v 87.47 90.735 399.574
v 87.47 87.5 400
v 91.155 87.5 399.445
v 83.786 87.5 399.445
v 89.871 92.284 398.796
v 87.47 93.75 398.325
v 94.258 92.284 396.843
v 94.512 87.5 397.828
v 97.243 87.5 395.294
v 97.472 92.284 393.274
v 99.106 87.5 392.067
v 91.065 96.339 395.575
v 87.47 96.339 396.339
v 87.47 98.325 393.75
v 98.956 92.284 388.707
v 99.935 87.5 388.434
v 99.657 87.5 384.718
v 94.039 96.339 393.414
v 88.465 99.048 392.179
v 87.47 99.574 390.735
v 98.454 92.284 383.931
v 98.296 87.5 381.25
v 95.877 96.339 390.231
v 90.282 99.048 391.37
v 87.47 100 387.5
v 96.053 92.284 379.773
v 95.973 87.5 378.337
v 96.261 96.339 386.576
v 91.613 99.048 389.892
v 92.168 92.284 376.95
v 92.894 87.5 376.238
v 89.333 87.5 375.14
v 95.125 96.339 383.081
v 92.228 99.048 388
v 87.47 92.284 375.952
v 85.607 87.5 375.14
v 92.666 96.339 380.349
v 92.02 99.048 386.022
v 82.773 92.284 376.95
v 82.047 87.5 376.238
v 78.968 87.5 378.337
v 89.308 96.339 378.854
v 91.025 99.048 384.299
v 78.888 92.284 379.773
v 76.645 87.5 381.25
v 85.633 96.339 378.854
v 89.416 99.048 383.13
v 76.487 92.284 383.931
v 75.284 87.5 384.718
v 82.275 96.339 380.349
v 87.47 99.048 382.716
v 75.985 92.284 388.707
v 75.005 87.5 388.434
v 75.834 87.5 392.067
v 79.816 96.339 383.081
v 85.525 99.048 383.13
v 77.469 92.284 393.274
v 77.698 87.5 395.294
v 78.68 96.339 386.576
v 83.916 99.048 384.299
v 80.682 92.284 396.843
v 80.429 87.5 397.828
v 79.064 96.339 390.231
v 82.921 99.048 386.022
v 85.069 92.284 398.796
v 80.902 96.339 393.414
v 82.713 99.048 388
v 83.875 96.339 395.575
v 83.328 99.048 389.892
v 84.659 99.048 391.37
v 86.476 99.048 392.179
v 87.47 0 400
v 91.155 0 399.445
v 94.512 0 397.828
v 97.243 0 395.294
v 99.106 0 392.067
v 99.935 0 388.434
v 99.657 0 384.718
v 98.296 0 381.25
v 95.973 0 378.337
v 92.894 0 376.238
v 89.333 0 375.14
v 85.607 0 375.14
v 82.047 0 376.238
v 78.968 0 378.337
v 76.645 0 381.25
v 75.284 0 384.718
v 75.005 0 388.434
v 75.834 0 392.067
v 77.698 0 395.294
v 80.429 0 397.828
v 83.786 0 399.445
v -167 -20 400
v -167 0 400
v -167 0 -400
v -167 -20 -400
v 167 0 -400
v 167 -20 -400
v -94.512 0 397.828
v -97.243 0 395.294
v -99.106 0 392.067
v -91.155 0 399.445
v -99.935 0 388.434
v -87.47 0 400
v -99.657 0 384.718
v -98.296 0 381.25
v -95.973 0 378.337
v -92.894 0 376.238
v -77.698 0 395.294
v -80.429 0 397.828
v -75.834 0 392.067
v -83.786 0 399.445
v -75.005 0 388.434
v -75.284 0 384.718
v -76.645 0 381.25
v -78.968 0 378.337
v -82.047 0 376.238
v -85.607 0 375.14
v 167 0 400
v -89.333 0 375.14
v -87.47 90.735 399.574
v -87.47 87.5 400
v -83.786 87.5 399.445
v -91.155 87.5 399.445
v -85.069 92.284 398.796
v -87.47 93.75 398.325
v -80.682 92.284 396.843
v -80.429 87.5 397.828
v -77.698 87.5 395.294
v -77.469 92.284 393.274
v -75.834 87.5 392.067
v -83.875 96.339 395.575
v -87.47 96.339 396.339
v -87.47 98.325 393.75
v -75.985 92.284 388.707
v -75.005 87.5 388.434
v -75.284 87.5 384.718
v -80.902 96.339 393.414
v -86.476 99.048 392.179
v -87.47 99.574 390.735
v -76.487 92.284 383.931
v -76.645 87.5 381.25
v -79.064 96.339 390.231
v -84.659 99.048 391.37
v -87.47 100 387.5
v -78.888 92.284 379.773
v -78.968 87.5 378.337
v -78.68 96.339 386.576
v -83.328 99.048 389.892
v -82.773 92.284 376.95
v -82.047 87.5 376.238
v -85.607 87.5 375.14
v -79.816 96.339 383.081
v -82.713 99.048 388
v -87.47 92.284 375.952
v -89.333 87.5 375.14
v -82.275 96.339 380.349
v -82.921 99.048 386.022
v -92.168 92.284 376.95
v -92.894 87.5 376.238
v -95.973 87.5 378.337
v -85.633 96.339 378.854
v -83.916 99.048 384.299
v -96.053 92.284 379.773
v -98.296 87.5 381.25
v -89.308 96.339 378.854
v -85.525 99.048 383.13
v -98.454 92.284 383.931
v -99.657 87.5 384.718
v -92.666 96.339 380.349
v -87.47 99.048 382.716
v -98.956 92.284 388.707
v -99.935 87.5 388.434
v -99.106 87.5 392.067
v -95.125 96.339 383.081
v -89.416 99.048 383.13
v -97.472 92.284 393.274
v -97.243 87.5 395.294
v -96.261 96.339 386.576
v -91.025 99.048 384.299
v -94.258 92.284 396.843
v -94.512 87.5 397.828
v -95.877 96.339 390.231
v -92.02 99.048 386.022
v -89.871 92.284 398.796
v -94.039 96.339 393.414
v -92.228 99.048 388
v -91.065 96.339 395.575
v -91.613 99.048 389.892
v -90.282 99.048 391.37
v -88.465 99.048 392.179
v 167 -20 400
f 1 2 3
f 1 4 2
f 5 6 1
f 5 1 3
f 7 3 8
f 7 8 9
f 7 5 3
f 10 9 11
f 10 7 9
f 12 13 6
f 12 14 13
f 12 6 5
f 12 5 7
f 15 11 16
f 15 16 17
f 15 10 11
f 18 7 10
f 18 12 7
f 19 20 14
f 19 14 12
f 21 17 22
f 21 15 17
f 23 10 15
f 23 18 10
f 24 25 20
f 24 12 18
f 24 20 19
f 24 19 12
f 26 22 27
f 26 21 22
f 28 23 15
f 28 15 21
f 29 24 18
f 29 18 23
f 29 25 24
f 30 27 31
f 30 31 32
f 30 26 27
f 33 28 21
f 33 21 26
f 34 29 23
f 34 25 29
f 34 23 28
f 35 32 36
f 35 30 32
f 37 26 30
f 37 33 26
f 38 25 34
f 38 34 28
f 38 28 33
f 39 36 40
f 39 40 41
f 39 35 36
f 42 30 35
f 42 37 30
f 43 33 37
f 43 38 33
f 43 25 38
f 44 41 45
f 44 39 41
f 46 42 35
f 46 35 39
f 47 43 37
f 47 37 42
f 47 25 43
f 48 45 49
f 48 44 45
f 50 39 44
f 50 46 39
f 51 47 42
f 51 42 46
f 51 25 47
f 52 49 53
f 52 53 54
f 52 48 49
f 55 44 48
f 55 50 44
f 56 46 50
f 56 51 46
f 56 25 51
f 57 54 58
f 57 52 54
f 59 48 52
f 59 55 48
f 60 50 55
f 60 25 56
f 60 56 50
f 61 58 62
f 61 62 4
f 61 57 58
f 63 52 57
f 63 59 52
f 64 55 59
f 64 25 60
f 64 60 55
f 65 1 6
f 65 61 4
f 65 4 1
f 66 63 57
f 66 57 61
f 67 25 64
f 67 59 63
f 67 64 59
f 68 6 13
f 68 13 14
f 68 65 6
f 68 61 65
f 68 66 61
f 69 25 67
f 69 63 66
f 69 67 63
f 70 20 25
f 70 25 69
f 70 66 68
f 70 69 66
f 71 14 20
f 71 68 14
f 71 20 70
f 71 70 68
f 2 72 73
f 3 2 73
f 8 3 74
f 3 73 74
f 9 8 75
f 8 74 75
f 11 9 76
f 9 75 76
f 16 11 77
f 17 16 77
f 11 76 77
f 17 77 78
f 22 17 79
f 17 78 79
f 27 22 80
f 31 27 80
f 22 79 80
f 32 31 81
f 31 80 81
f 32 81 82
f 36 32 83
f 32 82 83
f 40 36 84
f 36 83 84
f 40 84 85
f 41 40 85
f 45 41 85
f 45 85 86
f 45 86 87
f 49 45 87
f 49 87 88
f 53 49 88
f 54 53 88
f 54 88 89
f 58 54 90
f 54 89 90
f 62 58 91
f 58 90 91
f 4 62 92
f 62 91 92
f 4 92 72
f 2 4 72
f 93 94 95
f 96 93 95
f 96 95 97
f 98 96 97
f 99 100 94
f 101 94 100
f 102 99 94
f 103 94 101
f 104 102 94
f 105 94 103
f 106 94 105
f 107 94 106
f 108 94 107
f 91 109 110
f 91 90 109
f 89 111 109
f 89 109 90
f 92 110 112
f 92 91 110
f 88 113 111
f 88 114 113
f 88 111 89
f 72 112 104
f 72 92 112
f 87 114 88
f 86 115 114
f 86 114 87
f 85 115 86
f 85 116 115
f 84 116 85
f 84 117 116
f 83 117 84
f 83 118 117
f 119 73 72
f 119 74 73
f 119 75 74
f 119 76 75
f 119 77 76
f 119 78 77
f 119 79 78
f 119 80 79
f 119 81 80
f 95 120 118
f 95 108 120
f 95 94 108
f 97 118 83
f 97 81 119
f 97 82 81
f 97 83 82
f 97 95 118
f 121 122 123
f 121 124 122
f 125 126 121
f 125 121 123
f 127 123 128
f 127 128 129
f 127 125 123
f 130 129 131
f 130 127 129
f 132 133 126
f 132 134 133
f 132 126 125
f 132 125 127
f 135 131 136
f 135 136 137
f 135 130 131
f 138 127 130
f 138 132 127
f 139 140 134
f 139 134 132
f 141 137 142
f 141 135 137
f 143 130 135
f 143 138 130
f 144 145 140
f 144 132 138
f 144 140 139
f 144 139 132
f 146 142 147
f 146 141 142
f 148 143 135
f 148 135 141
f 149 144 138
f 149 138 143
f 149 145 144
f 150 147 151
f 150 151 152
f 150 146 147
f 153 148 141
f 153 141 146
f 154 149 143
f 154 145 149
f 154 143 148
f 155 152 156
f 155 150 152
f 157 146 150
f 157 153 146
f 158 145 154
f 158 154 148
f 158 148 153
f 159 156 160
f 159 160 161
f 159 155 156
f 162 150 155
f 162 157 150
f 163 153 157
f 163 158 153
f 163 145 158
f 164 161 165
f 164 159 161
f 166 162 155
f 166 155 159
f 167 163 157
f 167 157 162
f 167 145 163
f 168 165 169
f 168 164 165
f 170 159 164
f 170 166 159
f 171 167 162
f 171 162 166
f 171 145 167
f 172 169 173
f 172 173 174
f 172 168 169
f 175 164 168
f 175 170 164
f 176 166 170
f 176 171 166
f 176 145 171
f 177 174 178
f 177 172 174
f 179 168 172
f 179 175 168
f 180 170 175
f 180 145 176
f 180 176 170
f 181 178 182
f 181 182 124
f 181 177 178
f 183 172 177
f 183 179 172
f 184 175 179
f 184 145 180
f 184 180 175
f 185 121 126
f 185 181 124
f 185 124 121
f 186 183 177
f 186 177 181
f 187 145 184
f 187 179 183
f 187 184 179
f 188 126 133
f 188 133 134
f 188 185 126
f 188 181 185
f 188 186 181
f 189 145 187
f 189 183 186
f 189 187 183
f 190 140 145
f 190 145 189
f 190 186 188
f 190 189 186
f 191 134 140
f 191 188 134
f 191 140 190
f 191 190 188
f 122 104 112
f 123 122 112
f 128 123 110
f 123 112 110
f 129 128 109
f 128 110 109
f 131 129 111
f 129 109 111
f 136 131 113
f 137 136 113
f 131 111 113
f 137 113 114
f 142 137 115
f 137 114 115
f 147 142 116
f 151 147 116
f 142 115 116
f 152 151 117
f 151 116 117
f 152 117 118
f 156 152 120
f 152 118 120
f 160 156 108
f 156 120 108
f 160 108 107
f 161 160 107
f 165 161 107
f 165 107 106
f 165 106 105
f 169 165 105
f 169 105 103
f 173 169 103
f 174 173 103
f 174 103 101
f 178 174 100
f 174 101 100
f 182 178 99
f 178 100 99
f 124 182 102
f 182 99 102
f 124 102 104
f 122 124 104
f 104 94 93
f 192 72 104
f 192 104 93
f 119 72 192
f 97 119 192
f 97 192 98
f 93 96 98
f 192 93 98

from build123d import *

# Parameters (mm, degrees)
SKETCH_1_W      = 334
SKETCH_1_H      = 800
EXTRUDE_1_DEPTH = 20
SKETCH_3_R      = 12.5
EXTRUDE_4_DEPTH = 100
FILLET_1_R      = 12.5


with BuildPart() as part:
    # Эскиз1 → Бобышка-Вытянуть1 (new body)
    with BuildSketch(Plane(origin=(0, 0, 0), x_dir=(1, 0, 0), z_dir=(0, 1, 0))):
        Rectangle(SKETCH_1_W, SKETCH_1_H)
    extrude(amount=-EXTRUDE_1_DEPTH)

    # Эскиз3 → Бобышка-Вытянуть4 (add)
    with BuildSketch(Plane(origin=(0, 0, 0), x_dir=(1, 0, 0), z_dir=(0, 1, 0))):
        with Locations(Location((-87.470406544, -387.5, 0), (0, 0, 270))):
            Circle(SKETCH_3_R)
        with Locations(Location((87.470406544, -387.5, 0), (0, 0, 270))):
            Circle(SKETCH_3_R)
    extrude(amount=EXTRUDE_4_DEPTH)

    # Скругление1
    fillet_1_edges = [part.edges().sort_by_distance(p)[0] for p in [
        (-87.470406544, 100, 375),
        (87.470406544, 100, 375),
    ]]
    fillet(fillet_1_edges, radius=FILLET_1_R)


solid = part.part
